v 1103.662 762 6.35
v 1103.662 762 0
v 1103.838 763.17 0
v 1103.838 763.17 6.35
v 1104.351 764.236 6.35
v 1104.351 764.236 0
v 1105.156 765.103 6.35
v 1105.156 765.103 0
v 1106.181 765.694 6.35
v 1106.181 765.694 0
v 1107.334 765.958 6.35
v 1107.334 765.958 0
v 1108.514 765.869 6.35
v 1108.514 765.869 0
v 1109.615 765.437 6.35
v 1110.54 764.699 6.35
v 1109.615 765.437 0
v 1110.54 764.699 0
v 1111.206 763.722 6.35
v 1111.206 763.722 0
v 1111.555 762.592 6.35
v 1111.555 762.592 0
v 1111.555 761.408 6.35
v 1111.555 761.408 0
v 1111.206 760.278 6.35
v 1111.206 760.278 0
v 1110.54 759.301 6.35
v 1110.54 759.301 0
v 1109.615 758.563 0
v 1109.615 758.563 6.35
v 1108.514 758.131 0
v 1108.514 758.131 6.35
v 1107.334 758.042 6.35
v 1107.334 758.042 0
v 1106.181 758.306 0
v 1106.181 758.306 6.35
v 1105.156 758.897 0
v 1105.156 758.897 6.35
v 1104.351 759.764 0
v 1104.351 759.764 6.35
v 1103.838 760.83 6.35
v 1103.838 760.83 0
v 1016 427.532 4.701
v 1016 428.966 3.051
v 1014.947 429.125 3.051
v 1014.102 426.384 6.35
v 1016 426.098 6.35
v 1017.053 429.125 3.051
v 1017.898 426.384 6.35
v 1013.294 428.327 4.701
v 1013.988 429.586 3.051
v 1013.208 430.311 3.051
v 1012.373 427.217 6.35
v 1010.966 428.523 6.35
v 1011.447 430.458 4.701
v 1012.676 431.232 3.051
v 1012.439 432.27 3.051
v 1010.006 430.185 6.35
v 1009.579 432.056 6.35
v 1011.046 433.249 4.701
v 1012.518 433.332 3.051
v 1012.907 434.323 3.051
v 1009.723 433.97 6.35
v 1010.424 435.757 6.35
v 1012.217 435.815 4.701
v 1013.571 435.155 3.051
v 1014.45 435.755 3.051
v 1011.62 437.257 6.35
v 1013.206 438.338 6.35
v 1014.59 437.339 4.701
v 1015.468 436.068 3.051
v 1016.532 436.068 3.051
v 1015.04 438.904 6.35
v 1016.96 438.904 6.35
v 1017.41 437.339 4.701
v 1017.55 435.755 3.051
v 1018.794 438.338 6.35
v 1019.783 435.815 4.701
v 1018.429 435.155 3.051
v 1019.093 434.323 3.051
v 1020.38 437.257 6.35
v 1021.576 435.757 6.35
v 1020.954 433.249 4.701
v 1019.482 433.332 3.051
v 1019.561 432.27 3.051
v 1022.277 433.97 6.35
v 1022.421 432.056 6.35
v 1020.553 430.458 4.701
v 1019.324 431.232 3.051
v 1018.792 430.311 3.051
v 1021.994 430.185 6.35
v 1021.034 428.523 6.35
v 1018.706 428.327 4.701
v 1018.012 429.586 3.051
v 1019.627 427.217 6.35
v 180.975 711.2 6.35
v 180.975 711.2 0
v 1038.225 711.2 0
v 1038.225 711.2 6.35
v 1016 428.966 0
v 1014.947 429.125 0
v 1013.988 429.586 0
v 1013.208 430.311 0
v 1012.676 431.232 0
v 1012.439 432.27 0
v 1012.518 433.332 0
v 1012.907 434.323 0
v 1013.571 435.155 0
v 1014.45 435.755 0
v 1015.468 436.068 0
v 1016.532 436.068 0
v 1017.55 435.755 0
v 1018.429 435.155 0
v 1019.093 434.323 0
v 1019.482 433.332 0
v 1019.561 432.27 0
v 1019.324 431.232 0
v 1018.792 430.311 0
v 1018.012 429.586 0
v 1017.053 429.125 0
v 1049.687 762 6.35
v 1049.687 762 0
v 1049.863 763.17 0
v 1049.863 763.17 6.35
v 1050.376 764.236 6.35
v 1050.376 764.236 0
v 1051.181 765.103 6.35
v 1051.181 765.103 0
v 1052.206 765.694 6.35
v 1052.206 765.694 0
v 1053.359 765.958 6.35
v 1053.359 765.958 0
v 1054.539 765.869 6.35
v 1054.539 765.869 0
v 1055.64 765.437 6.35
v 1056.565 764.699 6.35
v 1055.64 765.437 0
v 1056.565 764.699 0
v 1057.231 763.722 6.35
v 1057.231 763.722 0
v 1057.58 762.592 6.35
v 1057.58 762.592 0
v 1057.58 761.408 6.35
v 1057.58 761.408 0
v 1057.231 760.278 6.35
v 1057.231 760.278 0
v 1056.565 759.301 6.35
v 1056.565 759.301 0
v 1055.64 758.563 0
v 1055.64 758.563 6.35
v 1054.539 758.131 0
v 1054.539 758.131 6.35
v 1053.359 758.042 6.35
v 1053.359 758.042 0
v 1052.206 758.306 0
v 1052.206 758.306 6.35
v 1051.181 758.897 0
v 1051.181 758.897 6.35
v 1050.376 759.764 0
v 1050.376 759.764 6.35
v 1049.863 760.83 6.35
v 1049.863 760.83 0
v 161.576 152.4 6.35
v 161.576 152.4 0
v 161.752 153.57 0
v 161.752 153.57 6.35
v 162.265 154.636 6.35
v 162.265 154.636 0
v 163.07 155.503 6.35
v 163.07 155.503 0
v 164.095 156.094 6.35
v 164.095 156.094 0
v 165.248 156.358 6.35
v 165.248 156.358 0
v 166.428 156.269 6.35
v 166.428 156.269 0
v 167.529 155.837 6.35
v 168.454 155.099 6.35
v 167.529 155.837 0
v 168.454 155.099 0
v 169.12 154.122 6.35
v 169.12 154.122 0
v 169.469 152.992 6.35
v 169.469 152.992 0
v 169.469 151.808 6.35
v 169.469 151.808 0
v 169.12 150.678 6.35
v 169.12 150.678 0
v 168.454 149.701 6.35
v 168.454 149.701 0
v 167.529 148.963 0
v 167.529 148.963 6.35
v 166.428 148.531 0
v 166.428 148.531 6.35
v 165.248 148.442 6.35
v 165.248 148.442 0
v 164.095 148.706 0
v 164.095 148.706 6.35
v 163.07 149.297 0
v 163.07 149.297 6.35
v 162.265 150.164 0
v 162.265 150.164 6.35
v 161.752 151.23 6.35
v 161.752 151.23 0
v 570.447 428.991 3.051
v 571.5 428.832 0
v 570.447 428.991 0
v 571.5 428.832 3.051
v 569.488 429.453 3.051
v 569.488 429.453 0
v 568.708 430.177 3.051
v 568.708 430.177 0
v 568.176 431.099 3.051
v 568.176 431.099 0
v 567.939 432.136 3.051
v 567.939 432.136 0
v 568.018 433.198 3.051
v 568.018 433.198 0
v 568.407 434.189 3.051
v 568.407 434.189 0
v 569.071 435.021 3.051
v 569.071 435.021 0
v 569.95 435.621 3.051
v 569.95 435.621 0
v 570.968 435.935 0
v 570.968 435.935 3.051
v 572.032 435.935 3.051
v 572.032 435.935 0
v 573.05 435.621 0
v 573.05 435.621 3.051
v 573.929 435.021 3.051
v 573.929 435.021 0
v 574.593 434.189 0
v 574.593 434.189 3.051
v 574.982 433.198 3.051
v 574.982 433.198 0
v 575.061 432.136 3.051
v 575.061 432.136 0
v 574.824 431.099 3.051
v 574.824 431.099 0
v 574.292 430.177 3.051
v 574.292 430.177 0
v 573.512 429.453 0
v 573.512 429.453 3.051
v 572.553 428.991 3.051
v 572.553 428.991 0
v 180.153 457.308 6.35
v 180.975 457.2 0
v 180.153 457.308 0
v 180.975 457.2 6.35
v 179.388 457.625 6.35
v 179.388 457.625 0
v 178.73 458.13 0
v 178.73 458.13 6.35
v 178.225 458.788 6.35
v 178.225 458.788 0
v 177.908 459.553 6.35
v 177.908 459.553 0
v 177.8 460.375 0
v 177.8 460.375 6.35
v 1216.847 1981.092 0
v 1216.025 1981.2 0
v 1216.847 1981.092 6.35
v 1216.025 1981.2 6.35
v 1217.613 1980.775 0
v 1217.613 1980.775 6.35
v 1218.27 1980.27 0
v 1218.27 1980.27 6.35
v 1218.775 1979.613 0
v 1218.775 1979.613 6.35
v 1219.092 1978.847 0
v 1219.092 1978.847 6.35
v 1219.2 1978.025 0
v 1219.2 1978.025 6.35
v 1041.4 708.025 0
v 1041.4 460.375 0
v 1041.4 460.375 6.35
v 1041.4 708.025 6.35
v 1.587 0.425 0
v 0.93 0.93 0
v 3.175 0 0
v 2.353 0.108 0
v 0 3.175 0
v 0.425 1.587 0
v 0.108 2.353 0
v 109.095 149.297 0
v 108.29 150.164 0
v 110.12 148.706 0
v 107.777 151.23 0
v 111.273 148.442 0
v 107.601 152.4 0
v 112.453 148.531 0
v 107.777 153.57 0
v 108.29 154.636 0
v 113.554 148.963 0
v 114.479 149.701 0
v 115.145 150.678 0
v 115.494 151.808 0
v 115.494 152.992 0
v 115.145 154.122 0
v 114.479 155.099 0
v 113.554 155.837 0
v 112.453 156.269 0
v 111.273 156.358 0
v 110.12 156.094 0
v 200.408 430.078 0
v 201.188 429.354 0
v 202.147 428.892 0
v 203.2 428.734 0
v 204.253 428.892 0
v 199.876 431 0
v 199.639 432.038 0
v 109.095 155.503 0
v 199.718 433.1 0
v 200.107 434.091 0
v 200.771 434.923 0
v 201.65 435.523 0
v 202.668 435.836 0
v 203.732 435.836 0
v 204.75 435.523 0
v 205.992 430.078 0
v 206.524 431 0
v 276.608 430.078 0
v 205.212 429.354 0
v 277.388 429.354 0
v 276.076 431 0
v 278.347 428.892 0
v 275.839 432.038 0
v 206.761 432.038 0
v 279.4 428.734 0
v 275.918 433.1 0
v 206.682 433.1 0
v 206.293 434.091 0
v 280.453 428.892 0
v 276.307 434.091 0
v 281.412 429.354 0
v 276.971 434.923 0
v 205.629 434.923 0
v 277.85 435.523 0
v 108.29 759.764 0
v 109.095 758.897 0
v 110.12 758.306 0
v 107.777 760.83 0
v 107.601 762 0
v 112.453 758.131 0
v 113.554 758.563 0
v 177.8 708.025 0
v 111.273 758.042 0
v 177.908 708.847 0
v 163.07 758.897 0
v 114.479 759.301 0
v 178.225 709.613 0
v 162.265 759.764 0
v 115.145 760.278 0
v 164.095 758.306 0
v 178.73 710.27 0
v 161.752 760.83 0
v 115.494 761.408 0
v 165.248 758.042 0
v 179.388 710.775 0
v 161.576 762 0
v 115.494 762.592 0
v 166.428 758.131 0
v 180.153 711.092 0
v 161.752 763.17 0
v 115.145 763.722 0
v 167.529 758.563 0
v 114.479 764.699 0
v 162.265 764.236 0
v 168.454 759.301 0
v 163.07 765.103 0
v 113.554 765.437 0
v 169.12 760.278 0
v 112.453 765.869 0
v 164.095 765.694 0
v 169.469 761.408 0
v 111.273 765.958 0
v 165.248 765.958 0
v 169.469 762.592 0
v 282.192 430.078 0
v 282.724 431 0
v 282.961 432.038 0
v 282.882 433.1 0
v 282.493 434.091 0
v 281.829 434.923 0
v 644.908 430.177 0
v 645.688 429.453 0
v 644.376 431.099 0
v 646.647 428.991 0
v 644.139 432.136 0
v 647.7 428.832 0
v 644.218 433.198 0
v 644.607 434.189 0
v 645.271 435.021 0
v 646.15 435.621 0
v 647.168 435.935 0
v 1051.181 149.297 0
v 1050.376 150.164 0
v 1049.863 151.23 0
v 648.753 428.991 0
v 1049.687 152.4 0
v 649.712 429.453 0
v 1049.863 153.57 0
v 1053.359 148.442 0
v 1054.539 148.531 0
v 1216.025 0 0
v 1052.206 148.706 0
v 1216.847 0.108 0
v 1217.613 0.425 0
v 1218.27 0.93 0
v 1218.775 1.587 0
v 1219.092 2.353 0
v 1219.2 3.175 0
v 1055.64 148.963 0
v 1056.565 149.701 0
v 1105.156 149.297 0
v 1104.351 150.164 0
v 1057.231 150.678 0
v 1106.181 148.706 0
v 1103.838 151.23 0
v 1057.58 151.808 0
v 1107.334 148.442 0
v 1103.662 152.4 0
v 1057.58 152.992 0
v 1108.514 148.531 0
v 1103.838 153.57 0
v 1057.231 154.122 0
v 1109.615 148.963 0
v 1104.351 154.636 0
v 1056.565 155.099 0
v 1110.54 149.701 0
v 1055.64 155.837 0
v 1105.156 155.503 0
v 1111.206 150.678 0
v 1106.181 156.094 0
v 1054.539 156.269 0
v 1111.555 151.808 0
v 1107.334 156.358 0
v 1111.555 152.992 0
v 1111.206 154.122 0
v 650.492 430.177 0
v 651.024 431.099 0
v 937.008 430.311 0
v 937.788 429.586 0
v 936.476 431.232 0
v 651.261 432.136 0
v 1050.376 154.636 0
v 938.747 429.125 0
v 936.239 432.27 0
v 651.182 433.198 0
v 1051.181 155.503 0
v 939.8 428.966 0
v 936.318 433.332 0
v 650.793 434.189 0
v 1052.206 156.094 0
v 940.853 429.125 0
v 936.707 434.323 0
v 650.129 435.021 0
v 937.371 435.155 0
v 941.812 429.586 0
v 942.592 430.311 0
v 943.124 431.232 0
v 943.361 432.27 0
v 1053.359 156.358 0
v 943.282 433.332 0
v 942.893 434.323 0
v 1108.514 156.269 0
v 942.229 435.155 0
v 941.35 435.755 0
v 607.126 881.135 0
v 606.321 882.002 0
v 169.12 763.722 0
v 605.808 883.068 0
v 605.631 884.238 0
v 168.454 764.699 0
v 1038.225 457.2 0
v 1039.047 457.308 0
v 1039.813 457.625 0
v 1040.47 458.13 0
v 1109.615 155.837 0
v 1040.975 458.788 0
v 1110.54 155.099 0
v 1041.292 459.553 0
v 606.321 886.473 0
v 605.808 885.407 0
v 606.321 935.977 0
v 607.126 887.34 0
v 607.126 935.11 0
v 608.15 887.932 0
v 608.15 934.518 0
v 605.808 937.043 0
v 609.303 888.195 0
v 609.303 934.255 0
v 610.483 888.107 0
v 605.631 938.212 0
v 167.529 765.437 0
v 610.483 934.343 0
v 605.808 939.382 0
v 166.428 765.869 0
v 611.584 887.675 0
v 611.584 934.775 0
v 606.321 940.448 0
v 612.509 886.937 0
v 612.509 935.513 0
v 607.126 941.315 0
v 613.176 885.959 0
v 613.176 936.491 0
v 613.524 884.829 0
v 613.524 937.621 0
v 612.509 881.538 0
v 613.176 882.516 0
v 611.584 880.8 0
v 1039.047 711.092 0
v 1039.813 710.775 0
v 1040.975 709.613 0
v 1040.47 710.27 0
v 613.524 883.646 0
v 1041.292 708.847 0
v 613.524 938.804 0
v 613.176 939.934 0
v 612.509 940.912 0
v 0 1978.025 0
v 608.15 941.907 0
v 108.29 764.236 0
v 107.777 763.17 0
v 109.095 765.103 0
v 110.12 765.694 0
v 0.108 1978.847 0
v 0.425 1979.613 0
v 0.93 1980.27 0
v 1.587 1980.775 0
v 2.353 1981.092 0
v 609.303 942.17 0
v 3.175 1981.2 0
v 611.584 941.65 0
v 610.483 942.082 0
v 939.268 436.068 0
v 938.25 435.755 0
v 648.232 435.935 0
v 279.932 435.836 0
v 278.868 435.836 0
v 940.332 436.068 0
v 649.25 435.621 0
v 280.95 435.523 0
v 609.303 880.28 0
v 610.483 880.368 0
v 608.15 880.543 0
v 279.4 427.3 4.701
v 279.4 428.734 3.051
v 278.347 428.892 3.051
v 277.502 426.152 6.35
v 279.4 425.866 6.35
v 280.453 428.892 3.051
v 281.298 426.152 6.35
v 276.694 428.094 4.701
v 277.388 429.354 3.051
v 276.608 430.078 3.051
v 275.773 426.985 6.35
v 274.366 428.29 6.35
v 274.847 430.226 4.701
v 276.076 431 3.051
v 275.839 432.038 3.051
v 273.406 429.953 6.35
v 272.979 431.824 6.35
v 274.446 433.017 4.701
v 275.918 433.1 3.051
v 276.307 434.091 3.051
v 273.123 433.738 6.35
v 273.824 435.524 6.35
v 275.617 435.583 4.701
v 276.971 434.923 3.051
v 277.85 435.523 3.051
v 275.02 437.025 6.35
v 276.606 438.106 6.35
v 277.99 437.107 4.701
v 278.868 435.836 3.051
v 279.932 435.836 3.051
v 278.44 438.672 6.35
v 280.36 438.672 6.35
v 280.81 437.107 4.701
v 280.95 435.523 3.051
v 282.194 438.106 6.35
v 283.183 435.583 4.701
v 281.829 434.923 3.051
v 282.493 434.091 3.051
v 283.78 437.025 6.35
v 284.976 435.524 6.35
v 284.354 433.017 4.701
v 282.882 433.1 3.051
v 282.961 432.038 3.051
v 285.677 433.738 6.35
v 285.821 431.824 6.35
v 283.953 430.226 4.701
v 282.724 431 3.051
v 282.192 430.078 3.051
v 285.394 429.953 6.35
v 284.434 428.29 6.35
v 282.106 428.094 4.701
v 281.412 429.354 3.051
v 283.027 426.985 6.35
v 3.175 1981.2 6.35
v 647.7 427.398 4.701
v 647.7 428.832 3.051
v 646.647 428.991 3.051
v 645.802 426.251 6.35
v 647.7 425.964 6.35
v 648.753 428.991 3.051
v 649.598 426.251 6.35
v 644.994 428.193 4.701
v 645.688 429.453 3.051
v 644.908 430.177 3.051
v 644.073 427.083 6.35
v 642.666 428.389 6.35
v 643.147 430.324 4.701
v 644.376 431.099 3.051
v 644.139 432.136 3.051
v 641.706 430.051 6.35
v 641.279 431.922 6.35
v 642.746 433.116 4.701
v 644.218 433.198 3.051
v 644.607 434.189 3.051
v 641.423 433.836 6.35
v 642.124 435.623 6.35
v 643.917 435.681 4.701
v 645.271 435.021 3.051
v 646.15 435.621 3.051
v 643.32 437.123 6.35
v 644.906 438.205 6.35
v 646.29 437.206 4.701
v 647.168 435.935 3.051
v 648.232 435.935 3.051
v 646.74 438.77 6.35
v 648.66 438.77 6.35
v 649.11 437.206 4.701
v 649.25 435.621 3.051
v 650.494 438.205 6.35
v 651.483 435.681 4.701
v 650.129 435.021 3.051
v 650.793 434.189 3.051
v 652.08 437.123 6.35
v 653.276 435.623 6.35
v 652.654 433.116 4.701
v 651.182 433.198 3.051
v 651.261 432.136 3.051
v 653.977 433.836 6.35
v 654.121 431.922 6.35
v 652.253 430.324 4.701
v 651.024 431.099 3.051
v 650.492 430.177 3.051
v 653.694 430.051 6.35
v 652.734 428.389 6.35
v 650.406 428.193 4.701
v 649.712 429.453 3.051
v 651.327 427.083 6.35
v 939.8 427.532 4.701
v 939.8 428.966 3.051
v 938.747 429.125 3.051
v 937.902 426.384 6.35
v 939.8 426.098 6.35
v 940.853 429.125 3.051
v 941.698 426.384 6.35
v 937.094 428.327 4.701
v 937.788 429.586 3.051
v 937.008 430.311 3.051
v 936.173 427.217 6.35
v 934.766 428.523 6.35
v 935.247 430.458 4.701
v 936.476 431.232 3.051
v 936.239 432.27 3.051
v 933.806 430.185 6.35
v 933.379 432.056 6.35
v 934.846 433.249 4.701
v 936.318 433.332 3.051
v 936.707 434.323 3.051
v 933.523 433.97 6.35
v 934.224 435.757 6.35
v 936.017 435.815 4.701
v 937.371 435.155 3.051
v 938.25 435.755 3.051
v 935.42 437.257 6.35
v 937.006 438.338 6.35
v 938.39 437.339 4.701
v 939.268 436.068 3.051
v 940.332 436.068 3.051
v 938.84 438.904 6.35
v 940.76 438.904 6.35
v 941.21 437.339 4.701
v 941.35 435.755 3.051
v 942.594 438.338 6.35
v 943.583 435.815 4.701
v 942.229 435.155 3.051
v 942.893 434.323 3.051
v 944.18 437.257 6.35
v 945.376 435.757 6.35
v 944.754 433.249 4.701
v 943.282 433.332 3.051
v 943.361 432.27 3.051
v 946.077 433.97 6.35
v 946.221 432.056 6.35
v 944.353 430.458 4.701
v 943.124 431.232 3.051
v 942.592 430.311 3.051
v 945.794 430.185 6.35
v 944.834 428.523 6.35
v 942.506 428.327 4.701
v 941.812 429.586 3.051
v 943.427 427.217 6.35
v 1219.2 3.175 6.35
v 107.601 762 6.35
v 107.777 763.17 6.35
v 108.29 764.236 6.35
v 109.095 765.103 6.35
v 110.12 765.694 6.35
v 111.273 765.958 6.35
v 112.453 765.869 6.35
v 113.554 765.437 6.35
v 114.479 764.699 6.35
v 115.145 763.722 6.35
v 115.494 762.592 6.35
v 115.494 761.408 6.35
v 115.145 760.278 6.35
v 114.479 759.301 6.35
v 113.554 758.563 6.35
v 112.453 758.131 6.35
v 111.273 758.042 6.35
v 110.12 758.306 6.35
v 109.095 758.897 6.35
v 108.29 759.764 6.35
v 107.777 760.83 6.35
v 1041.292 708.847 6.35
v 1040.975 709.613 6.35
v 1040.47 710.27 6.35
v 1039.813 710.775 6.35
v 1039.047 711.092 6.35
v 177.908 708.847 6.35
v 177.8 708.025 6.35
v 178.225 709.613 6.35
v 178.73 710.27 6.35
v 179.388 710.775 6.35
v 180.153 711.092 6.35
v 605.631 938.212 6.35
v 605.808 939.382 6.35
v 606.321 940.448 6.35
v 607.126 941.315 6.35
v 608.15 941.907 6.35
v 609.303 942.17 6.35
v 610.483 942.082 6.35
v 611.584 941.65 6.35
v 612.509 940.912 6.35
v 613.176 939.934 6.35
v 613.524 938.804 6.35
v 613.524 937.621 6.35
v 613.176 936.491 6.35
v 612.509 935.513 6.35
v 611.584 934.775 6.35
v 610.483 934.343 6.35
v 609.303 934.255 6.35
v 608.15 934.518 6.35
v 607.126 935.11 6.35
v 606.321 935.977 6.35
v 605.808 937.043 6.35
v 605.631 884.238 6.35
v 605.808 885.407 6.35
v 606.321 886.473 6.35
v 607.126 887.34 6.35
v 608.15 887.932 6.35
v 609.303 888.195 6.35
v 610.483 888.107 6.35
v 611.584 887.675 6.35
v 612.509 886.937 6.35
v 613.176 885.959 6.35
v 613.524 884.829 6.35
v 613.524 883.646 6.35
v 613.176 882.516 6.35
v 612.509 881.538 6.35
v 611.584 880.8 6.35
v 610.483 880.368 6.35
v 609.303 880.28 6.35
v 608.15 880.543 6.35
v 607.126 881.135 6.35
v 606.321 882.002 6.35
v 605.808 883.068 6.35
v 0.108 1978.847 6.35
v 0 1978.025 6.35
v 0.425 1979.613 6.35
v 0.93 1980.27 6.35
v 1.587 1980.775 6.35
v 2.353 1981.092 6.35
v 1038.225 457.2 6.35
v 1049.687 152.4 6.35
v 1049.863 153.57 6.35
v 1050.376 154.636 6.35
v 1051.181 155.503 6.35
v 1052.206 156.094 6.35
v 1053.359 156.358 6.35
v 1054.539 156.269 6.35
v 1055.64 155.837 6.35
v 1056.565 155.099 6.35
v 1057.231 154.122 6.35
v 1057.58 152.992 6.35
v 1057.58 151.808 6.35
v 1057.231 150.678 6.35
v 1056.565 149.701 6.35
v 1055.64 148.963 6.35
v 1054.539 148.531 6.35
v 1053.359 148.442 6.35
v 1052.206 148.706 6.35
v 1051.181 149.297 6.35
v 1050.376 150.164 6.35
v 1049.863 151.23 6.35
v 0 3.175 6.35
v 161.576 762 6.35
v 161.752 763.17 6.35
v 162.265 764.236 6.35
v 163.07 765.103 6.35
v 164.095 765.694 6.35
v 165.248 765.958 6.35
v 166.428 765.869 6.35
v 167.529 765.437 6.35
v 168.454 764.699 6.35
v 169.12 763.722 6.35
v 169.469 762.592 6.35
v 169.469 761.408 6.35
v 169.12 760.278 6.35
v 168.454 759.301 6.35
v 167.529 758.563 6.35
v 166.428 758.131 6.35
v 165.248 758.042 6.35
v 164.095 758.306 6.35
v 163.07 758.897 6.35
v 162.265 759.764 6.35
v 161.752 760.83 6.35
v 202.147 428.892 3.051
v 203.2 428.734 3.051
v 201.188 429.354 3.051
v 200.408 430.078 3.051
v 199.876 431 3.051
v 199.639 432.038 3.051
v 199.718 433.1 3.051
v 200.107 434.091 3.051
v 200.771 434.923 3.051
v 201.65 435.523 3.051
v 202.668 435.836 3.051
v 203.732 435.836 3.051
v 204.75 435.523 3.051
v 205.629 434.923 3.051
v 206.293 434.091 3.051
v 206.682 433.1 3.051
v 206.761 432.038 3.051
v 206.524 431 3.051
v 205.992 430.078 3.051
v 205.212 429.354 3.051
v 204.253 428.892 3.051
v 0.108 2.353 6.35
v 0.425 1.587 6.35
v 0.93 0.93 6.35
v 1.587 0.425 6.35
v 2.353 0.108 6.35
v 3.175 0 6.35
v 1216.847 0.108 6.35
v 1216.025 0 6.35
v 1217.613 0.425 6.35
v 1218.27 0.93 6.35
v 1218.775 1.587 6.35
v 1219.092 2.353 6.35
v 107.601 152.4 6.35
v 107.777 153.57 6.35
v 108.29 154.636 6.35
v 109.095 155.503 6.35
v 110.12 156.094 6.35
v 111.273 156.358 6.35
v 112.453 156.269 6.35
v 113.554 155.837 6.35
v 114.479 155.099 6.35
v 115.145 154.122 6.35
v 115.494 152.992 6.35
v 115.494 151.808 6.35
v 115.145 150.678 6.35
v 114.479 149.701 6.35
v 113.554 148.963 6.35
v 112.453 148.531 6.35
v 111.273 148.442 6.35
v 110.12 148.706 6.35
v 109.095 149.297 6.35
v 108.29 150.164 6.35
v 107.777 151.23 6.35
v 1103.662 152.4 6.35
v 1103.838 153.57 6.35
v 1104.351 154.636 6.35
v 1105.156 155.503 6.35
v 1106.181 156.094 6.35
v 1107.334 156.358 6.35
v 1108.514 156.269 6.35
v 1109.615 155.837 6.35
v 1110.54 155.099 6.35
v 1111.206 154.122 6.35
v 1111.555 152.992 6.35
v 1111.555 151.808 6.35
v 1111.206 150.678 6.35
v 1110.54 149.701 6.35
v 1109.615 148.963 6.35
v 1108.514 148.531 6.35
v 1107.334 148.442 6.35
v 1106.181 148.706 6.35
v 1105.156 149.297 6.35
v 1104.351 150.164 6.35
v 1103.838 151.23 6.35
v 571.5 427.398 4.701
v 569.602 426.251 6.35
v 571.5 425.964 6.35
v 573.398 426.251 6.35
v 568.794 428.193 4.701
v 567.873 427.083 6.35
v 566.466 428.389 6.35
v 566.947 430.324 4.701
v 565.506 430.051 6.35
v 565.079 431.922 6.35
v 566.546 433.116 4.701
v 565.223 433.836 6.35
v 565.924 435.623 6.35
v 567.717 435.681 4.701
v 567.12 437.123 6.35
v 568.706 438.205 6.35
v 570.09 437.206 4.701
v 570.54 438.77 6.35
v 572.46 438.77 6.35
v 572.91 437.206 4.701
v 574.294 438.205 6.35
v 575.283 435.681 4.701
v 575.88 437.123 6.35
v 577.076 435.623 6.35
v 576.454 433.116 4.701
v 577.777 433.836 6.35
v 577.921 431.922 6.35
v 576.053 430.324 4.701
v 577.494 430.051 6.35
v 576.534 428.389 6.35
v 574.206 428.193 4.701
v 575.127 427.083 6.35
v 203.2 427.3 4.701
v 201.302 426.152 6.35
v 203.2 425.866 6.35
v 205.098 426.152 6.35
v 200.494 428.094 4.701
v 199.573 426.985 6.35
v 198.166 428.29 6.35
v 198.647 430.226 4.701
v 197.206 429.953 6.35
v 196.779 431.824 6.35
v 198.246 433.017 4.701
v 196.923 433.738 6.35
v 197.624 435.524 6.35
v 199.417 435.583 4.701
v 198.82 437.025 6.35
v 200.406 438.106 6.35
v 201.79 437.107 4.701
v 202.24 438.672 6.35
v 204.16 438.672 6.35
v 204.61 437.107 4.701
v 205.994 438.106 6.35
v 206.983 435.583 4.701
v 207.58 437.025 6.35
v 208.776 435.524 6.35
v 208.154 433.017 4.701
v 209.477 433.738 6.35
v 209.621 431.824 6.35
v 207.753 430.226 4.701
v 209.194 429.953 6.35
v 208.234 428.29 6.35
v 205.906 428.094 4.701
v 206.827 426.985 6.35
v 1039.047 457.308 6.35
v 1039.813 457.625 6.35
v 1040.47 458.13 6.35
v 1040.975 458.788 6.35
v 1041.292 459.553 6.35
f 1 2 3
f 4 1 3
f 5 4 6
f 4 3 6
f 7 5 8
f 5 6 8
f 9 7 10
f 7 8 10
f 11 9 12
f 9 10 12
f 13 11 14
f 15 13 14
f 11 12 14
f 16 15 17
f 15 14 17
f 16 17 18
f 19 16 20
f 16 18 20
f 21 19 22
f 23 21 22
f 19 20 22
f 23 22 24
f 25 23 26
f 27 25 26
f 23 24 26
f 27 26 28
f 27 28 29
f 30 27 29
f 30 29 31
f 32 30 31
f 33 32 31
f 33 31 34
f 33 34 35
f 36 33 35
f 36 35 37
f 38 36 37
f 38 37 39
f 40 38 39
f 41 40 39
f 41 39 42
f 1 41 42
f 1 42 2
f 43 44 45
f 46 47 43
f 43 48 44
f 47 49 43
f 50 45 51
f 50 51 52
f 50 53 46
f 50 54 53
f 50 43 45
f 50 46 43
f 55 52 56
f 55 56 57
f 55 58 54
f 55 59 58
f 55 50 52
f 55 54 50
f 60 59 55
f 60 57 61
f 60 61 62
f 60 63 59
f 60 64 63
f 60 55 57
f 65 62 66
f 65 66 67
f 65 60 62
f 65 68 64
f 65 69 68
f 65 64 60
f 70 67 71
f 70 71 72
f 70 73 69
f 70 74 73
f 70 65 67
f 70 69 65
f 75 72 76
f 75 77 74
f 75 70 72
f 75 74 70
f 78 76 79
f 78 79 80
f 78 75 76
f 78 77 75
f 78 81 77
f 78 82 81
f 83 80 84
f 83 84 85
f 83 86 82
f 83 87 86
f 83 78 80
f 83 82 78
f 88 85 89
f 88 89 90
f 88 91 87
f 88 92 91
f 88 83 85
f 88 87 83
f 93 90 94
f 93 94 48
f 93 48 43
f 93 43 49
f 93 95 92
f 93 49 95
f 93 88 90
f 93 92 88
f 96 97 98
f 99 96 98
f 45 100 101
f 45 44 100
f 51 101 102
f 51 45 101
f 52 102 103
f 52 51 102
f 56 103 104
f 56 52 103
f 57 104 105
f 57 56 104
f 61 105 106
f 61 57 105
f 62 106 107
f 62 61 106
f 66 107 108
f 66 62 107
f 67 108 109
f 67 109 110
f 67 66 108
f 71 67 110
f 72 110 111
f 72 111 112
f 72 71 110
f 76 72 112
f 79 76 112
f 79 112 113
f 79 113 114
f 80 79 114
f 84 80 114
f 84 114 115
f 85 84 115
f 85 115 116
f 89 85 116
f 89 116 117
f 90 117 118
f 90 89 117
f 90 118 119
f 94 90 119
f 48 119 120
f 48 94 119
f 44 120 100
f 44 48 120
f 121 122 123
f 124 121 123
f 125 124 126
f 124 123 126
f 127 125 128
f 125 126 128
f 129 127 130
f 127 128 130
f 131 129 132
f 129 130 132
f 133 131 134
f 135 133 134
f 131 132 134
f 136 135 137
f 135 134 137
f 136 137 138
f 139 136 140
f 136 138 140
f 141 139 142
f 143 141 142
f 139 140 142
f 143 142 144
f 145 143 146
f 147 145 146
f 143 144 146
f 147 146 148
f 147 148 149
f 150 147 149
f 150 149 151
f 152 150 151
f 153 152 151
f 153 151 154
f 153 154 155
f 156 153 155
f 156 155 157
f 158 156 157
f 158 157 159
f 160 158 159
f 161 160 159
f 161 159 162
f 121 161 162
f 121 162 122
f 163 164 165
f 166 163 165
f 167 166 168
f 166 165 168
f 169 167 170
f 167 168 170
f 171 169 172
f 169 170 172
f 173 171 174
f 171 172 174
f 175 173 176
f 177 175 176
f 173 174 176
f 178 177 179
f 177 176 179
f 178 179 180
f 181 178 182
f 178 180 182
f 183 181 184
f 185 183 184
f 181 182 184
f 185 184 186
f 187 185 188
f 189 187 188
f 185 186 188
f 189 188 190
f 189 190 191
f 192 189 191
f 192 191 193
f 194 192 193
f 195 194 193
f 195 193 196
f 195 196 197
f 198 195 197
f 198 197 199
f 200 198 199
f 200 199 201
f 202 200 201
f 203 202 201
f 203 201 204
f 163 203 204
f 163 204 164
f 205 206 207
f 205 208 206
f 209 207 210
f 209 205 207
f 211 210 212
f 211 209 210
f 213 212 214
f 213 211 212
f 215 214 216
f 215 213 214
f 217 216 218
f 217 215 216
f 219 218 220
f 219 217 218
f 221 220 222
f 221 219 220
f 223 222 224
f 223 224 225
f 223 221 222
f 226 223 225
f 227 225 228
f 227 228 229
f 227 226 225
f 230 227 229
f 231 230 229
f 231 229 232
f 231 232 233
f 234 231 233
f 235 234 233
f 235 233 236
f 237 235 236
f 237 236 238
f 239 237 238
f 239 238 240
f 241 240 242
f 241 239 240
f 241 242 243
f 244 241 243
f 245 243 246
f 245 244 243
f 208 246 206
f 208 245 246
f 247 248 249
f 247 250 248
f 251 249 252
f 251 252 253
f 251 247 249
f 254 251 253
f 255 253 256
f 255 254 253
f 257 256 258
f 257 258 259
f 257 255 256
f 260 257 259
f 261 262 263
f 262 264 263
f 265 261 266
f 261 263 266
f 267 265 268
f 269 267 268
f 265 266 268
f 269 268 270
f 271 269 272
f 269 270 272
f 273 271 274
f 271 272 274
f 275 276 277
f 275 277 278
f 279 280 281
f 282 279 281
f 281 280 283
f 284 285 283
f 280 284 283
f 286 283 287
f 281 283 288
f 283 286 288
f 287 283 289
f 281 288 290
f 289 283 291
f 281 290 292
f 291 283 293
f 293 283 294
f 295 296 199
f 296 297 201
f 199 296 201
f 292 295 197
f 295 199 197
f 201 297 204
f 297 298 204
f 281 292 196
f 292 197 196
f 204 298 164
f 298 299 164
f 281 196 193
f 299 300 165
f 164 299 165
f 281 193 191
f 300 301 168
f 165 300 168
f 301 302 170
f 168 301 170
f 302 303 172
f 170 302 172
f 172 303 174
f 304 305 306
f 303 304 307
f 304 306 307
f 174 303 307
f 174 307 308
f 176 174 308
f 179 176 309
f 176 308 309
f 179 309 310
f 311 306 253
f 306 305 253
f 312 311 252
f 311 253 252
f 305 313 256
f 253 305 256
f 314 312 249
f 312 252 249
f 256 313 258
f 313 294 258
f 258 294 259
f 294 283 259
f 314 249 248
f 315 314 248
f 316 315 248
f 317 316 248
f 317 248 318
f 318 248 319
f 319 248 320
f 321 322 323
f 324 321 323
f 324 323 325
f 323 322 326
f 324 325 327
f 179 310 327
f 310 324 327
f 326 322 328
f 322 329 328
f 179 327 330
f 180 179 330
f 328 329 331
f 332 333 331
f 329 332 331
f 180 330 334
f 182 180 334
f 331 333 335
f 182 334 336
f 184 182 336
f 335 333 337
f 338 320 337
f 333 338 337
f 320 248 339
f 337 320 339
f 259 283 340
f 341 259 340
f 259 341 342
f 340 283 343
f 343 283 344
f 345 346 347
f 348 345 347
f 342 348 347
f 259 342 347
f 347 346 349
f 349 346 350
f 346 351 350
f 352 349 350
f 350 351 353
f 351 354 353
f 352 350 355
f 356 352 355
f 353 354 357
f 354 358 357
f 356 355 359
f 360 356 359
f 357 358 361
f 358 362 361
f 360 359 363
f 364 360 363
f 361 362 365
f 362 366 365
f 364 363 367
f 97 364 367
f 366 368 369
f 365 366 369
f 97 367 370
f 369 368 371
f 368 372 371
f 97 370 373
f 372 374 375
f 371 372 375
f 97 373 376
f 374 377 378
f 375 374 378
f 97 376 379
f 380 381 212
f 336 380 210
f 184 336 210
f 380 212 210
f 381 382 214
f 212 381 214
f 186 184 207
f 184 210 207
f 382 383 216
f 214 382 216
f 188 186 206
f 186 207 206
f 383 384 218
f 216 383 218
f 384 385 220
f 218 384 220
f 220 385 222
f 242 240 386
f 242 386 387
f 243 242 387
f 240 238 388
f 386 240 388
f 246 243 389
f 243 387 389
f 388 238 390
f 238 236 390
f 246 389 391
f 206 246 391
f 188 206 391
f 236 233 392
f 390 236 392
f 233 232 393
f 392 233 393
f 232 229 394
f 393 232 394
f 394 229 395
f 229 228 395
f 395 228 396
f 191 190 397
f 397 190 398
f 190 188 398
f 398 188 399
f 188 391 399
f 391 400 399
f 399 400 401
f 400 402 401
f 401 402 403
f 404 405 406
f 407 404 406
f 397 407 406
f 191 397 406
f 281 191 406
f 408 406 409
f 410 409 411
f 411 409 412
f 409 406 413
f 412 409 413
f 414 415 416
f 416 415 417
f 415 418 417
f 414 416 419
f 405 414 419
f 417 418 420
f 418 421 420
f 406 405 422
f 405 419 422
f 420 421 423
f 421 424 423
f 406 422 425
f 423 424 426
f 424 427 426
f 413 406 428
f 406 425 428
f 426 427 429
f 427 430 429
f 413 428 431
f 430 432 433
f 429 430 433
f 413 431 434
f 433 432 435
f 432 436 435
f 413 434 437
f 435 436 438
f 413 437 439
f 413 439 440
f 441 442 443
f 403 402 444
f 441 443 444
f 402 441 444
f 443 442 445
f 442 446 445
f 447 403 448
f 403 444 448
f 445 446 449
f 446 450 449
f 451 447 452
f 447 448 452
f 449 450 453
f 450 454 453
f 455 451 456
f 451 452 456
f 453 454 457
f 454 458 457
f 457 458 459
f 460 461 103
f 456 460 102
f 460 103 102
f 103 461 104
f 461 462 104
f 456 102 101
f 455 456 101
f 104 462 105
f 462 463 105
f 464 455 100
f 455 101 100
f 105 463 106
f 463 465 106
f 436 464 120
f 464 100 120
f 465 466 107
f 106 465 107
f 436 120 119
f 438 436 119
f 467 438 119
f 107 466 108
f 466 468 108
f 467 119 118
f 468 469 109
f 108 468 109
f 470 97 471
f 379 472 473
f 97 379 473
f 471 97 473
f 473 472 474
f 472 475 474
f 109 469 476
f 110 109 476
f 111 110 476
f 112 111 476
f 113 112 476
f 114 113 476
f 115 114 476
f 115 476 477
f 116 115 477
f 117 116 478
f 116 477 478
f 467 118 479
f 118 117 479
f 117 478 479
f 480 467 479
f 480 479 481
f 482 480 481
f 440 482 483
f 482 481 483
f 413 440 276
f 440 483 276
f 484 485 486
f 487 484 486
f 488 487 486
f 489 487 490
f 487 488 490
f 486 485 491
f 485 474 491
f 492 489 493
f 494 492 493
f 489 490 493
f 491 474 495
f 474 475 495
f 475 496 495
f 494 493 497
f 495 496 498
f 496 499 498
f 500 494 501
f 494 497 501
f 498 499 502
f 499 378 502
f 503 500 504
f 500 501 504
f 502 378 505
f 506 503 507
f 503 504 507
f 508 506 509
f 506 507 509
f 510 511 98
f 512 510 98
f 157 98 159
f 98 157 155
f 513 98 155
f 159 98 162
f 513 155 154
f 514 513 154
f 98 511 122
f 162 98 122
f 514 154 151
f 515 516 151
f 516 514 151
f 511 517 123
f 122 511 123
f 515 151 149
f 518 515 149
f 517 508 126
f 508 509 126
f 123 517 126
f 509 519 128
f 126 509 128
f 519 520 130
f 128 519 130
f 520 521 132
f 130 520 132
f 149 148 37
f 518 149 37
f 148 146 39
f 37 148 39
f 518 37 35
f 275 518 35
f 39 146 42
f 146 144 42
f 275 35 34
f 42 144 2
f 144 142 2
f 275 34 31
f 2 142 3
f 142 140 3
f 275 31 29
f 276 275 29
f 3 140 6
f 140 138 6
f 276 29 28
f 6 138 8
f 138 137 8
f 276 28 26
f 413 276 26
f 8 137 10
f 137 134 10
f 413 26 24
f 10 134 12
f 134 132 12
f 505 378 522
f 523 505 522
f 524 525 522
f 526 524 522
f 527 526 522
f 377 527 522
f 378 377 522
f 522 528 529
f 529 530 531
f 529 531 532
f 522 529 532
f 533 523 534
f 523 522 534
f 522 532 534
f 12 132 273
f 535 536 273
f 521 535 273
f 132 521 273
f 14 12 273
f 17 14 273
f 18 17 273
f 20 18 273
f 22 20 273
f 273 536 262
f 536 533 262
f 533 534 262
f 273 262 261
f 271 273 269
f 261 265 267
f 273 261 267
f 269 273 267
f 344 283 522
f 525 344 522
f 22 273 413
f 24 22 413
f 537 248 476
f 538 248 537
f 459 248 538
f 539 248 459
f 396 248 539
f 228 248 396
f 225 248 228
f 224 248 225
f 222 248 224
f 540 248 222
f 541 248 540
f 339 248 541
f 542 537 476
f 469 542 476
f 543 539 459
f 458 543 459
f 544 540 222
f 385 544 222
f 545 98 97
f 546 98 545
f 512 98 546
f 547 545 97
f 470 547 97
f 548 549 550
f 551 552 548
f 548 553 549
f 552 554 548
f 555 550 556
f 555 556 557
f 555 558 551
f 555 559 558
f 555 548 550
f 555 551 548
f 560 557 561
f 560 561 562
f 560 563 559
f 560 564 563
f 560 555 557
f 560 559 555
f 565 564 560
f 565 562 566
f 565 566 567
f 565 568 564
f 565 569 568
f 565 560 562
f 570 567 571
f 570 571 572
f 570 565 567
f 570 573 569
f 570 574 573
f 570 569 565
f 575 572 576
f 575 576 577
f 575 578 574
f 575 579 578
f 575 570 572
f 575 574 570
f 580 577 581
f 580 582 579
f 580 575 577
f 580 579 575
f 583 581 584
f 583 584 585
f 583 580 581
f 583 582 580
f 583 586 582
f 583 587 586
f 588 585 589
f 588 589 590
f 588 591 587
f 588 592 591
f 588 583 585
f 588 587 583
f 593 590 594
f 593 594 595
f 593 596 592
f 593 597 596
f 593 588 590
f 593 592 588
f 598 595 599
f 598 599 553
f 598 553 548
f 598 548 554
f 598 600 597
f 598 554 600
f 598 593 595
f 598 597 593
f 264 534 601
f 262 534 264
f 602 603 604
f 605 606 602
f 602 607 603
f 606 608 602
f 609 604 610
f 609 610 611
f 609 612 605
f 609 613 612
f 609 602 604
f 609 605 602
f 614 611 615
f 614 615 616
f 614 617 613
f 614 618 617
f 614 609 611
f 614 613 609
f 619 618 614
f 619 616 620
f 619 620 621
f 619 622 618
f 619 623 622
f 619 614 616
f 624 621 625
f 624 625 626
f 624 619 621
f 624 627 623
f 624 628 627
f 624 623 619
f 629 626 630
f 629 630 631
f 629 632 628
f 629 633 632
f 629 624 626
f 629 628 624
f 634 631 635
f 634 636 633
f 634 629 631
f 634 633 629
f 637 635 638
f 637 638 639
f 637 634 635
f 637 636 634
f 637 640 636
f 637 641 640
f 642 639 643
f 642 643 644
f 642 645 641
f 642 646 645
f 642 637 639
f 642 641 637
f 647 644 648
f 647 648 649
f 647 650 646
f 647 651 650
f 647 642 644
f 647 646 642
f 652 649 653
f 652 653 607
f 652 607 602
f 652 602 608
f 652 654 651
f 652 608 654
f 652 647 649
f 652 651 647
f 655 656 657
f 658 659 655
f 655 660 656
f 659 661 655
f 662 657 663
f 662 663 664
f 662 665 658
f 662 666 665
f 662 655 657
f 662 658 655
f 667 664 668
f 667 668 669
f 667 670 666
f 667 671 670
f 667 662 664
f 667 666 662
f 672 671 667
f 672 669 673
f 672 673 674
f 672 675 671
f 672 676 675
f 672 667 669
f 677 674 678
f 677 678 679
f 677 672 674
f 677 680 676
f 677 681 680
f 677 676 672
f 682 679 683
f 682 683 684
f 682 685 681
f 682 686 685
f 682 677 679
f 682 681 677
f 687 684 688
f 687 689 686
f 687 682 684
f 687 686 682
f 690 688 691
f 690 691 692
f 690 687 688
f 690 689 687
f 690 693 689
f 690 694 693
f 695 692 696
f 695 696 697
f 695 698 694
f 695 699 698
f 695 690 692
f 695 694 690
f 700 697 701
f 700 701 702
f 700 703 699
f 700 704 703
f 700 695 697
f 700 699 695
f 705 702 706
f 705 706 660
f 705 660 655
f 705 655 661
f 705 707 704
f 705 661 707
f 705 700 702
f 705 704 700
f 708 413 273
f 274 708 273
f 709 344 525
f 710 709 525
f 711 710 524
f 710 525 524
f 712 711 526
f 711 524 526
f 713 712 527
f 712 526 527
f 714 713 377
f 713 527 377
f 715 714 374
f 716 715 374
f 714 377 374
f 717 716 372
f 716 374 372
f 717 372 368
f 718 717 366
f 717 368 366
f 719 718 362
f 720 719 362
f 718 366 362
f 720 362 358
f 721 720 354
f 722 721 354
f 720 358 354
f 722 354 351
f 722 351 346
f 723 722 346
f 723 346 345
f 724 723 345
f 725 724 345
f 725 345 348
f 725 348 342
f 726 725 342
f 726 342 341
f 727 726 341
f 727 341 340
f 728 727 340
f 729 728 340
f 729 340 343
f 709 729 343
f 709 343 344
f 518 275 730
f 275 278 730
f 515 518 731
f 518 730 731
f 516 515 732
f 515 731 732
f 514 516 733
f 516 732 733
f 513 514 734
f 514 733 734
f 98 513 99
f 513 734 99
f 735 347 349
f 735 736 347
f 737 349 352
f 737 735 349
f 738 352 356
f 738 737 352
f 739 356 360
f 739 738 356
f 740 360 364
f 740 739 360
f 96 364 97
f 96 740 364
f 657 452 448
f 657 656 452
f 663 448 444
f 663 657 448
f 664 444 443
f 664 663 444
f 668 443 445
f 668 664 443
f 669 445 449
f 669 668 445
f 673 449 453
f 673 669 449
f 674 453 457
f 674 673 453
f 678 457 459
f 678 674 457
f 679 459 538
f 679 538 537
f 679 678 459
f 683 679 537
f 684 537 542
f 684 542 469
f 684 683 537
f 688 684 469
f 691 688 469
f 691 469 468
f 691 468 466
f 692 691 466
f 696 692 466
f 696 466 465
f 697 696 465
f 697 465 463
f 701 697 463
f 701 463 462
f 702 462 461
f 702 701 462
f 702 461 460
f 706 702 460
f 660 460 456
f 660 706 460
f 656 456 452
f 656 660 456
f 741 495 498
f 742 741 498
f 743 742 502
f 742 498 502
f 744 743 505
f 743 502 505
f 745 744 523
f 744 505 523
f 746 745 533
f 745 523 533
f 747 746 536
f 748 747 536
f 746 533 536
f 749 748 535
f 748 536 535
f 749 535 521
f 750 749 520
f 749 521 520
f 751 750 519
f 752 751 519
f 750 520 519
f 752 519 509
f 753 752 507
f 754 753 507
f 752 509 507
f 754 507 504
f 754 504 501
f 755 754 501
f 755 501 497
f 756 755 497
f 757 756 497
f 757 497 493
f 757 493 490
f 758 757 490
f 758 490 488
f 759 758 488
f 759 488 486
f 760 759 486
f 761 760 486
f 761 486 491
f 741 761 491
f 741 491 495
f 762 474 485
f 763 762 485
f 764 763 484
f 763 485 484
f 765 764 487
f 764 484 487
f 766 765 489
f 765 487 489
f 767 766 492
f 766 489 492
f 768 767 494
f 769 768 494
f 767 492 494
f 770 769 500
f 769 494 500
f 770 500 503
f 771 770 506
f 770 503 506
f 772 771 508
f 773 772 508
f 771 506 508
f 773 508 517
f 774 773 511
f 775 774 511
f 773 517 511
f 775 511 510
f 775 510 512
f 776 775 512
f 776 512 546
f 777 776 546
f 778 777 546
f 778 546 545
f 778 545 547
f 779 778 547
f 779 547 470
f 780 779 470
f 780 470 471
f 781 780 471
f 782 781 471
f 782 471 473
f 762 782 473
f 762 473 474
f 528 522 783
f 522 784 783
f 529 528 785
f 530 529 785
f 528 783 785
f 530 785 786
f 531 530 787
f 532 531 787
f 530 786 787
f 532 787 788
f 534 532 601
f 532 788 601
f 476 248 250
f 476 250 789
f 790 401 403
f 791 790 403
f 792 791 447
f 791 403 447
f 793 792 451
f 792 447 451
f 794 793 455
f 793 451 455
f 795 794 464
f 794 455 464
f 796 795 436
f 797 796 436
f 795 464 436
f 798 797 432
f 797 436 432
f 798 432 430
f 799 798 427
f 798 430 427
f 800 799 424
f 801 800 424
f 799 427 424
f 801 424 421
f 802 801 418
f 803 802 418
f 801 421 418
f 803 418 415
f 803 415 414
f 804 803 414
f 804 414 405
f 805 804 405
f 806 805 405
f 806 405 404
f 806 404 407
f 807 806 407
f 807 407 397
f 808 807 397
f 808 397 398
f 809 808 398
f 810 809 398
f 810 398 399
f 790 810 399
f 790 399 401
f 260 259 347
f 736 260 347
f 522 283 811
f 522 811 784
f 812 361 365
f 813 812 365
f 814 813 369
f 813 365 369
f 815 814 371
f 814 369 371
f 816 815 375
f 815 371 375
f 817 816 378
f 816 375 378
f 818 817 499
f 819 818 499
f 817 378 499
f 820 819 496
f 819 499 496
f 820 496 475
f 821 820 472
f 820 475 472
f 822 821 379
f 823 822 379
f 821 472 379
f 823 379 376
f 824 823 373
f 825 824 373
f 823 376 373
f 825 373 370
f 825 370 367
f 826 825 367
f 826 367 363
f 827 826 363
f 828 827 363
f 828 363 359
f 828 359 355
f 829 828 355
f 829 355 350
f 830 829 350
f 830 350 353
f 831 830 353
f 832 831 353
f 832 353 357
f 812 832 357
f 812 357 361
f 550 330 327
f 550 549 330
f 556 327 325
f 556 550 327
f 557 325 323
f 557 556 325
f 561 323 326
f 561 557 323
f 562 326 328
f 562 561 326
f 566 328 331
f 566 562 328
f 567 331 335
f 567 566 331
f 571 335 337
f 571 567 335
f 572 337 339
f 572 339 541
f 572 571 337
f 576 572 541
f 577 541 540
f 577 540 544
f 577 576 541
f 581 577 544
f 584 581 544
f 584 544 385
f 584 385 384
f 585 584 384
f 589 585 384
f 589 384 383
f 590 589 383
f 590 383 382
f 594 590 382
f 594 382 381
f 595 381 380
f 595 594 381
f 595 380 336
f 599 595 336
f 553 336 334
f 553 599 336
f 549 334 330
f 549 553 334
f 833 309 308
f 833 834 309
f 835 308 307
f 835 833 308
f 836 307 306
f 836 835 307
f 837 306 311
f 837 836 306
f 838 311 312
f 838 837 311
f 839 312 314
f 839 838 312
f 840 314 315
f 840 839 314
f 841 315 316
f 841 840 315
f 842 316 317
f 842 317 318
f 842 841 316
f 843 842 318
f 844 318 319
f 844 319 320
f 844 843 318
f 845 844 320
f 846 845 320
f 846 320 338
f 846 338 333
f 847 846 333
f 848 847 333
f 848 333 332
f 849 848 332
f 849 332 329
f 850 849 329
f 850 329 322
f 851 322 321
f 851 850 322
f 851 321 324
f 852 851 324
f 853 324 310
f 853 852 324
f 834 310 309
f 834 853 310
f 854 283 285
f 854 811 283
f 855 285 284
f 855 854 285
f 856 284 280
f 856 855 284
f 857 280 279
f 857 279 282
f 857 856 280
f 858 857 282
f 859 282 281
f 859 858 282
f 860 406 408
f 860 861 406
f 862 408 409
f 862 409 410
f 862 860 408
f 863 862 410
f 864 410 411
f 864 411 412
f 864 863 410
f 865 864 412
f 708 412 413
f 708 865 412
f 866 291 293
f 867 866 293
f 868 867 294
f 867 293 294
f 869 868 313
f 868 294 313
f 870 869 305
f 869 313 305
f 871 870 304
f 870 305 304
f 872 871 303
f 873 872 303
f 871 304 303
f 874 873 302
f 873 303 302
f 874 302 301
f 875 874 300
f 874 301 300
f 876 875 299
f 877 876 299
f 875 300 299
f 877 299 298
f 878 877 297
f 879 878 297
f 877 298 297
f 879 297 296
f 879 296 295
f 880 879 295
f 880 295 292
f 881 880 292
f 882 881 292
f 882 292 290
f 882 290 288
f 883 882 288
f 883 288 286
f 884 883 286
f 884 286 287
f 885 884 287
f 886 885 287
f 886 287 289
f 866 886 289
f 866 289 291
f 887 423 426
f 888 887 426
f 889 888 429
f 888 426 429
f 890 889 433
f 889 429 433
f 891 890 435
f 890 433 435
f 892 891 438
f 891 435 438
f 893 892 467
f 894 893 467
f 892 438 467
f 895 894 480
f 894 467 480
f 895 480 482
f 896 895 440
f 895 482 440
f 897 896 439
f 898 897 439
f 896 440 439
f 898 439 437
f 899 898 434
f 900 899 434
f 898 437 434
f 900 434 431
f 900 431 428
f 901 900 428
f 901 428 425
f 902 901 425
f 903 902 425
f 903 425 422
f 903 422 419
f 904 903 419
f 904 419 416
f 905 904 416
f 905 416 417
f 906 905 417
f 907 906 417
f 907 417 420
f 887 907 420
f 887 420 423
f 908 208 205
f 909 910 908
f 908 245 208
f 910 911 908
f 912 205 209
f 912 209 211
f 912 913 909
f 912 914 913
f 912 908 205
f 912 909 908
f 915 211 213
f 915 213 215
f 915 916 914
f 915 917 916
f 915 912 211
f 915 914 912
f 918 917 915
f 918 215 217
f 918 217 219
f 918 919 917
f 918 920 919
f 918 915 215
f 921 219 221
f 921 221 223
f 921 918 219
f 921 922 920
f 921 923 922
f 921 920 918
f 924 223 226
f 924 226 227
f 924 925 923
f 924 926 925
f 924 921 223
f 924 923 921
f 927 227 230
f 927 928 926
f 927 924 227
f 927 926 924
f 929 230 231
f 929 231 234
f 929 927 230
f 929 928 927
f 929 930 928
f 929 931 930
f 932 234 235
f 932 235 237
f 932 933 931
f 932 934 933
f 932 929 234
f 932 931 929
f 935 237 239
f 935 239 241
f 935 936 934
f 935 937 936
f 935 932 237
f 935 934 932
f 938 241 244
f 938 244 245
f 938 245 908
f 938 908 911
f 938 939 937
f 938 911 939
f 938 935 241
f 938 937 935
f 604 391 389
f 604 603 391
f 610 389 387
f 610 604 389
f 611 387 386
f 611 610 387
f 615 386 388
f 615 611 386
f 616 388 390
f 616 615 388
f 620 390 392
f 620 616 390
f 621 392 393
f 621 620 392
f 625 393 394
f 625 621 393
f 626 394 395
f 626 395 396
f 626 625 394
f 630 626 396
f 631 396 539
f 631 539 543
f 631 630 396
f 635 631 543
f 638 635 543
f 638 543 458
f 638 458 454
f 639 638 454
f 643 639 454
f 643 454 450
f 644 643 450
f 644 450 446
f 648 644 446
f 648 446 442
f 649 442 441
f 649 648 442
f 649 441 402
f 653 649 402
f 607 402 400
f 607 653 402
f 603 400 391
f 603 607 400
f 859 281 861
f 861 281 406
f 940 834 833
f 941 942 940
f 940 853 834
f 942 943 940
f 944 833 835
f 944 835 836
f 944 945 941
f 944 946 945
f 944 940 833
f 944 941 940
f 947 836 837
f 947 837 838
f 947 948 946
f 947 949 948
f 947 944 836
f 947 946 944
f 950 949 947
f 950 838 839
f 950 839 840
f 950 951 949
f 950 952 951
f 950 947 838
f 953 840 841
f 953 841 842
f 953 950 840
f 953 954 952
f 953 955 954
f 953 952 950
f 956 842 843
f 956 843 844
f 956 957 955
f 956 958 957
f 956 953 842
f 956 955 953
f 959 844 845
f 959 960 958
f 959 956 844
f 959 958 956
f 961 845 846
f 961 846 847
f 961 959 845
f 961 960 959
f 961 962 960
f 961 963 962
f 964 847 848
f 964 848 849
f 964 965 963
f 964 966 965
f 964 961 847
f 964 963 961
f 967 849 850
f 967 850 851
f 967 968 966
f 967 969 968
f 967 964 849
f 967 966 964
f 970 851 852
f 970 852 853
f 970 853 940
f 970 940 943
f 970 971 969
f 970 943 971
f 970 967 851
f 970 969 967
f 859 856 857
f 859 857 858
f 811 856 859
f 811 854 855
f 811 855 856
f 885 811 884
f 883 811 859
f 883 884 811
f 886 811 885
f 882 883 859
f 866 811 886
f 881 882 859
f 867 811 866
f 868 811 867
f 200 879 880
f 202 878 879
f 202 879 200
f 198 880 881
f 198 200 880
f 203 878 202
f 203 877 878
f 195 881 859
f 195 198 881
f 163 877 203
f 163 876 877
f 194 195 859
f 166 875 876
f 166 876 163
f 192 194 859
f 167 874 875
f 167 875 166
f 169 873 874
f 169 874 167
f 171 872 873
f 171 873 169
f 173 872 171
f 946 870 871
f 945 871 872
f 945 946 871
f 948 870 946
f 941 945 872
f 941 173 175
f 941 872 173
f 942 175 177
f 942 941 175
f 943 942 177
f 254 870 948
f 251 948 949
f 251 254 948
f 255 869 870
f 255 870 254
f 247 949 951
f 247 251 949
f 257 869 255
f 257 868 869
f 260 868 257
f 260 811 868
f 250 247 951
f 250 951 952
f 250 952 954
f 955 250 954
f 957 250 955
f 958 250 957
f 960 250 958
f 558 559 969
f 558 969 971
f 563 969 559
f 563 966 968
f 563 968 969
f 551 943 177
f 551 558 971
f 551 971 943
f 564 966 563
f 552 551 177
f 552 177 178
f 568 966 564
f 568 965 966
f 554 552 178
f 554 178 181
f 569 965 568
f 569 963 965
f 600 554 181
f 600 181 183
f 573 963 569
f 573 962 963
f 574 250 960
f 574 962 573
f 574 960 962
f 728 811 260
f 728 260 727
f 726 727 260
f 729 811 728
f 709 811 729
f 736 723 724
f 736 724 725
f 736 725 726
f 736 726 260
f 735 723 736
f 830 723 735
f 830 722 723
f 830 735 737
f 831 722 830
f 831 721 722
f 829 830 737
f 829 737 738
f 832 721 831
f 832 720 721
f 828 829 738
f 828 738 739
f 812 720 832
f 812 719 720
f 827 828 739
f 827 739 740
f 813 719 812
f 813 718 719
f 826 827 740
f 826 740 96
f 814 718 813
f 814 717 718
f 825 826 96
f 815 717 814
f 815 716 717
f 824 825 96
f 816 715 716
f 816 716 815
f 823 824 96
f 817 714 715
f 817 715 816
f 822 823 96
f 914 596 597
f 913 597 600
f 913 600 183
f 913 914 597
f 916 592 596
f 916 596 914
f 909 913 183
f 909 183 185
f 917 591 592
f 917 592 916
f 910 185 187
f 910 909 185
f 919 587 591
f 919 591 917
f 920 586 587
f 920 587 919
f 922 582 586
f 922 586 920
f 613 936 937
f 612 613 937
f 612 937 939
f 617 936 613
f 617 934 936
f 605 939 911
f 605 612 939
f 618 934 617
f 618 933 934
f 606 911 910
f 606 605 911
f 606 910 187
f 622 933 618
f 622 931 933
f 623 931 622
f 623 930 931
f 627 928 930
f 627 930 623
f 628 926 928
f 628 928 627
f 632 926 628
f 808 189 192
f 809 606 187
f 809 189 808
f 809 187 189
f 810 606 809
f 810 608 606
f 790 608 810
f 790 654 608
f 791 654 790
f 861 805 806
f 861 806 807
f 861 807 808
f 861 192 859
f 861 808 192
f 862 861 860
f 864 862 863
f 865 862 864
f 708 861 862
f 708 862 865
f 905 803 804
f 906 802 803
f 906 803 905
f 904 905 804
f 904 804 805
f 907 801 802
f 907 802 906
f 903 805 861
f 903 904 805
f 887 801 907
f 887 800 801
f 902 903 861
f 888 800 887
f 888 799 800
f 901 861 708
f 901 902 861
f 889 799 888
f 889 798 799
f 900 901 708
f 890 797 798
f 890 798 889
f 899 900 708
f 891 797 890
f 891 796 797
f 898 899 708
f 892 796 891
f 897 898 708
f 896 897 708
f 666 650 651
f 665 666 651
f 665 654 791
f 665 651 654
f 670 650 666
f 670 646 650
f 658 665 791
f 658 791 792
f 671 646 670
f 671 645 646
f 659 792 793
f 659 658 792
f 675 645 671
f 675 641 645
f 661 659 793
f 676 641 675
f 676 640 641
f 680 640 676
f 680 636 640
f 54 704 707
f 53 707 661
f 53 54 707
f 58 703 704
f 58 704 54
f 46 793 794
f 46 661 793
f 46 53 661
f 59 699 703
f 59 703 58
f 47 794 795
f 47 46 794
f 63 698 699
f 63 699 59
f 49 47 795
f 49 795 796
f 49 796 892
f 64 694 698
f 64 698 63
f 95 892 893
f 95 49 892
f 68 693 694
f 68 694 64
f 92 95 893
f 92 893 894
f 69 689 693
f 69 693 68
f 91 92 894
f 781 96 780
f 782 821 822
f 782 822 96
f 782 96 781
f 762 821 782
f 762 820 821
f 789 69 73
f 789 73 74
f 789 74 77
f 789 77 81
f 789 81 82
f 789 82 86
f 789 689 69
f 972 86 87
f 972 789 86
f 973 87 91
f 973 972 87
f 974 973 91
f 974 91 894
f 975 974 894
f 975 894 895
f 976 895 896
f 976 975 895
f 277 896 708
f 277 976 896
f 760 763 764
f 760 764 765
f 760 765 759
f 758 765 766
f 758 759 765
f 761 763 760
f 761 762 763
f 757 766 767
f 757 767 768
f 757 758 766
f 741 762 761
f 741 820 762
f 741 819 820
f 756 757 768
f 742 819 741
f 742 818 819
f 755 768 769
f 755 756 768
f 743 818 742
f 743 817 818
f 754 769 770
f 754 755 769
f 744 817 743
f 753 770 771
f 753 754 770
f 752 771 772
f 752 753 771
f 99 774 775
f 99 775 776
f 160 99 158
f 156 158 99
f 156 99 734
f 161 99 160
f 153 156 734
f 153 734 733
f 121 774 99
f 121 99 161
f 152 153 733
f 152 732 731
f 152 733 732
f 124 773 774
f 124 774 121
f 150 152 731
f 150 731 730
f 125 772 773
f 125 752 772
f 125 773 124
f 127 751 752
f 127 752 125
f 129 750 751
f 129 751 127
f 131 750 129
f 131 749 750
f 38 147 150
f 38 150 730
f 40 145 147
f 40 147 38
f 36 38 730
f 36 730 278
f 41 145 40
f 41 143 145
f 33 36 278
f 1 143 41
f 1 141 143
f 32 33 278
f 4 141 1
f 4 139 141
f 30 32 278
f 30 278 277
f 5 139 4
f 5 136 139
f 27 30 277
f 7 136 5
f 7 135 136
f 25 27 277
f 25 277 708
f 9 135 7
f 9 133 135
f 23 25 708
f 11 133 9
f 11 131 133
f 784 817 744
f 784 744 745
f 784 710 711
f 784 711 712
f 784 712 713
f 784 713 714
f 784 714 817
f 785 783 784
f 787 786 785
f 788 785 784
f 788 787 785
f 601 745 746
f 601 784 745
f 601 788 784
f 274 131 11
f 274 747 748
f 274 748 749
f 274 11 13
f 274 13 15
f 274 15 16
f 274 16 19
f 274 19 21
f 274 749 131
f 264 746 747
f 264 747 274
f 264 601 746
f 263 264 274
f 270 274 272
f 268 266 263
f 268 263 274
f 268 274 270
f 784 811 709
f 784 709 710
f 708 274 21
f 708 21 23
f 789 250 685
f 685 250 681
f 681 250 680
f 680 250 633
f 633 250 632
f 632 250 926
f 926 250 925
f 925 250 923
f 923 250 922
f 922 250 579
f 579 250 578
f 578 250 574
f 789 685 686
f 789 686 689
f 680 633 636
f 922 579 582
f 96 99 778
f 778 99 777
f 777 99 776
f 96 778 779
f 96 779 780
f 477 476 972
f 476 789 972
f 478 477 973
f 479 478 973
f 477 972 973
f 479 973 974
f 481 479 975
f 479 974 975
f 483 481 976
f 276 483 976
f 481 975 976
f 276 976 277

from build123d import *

# Parameters (mm, degrees)
SKETCH1_W                                     = 1219.2
SKETCH1_H                                     = 1981.2
SKETCH1_W_2                                   = 863.6
SKETCH1_H_2                                   = 254
BOSS_EXTRUDE1_DEPTH                           = 6.35
CSK_FOR_1_4_FLAT_HEAD_MACHINE_SCREW1_AT_COUNT = 2
CSK_FOR_1_4_FLAT_HEAD_MACHINE_SCREW1_AT_PITCH = 76.2
CSK_FOR_1_4_FLAT_HEAD_MACHINE_SCREW1_2_COUNT  = 2
CSK_FOR_1_4_FLAT_HEAD_MACHINE_SCREW1_2_PITCH  = 736.600036601
CSK_FOR_1_4_FLAT_HEAD_MACHINE_SCREW1_3_COUNT  = 2
CSK_FOR_1_4_FLAT_HEAD_MACHINE_SCREW1_3_PITCH  = 812.800033169
CSK_FOR_1_4_FLAT_HEAD_MACHINE_SCREW1_4_COUNT  = 2
CSK_FOR_1_4_FLAT_HEAD_MACHINE_SCREW1_4_PITCH  = 368.300013149
CSK_FOR_1_4_FLAT_HEAD_MACHINE_SCREW1_5_COUNT  = 2
CSK_FOR_1_4_FLAT_HEAD_MACHINE_SCREW1_5_PITCH  = 444.500010895
FILLET1_R                                     = 3.175
F_5_16_0_3125_DIAMETER_HOLE2_D                = 7.9375


with BuildPart() as part:
    # Sketch1 → Boss-Extrude1 (new body)
    with BuildSketch(Plane.XY):
        with Locations((609.6, 990.6)):
            Rectangle(SKETCH1_W, SKETCH1_H)
        with Locations((609.6, 584.2)):
            Rectangle(SKETCH1_W_2, SKETCH1_H_2, mode=Mode.SUBTRACT)
    extrude(amount=BOSS_EXTRUDE1_DEPTH)

    # Sketch3 → CSK for 1/4 Flat Head Machine Screw1 (revolve, cut)
    with BuildSketch(Plane(origin=(203.2, 432.304928843, 6.35), x_dir=(0, -1, 0), z_dir=(1, 0, 0))):
        Polygon((0, 0), (0, 6.35), (3.57124, 6.35), (3.57124, 3.298865467), (6.4389, 0), align=None)
    csk_for_1_4_flat_head_machine_screw1 = revolve(axis=Axis((203.2, 432.304928843, 12.7), (0, 0, -1)), mode=Mode.SUBTRACT)

    # CSK for 1/4 Flat Head Machine Screw1 at: CSK for 1/4 Flat Head Machine Screw1 ×2
    with Locations(*[(i * CSK_FOR_1_4_FLAT_HEAD_MACHINE_SCREW1_AT_PITCH, 0, 0) for i in range(1, CSK_FOR_1_4_FLAT_HEAD_MACHINE_SCREW1_AT_COUNT)]):
        add(csk_for_1_4_flat_head_machine_screw1, mode=Mode.SUBTRACT)

    # CSK for 1_4 Flat Head Machine Screw1 2: CSK for 1/4 Flat Head Machine Screw1 ×2
    with Locations(*[Vector(0.99999995, 0.000315241, 0) * (i * CSK_FOR_1_4_FLAT_HEAD_MACHINE_SCREW1_2_PITCH) for i in range(1, CSK_FOR_1_4_FLAT_HEAD_MACHINE_SCREW1_2_COUNT)]):
        add(csk_for_1_4_flat_head_machine_screw1, mode=Mode.SUBTRACT)

    # CSK for 1_4 Flat Head Machine Screw1 3: CSK for 1/4 Flat Head Machine Screw1 ×2
    with Locations(*[Vector(0.999999959, 0.000285687, 0) * (i * CSK_FOR_1_4_FLAT_HEAD_MACHINE_SCREW1_3_PITCH) for i in range(1, CSK_FOR_1_4_FLAT_HEAD_MACHINE_SCREW1_3_COUNT)]):
        add(csk_for_1_4_flat_head_machine_screw1, mode=Mode.SUBTRACT)

    # CSK for 1_4 Flat Head Machine Screw1 4: CSK for 1/4 Flat Head Machine Screw1 ×2
    with Locations(*[Vector(0.999999964, 0.000267211, 0) * (i * CSK_FOR_1_4_FLAT_HEAD_MACHINE_SCREW1_4_PITCH) for i in range(1, CSK_FOR_1_4_FLAT_HEAD_MACHINE_SCREW1_4_COUNT)]):
        add(csk_for_1_4_flat_head_machine_screw1, mode=Mode.SUBTRACT)

    # CSK for 1_4 Flat Head Machine Screw1 5: CSK for 1/4 Flat Head Machine Screw1 ×2
    with Locations(*[Vector(0.999999975, 0.000221404, 0) * (i * CSK_FOR_1_4_FLAT_HEAD_MACHINE_SCREW1_5_PITCH) for i in range(1, CSK_FOR_1_4_FLAT_HEAD_MACHINE_SCREW1_5_COUNT)]):
        add(csk_for_1_4_flat_head_machine_screw1, mode=Mode.SUBTRACT)

    # Fillet1
    fillet1_edges = [part.edges().sort_by_distance(p)[0] for p in [
        (177.8, 711.2, 3.175),
        (177.8, 457.2, 3.175),
        (1041.4, 457.2, 3.175),
        (1041.4, 711.2, 3.175),
        (0, 1981.2, 3.175),
        (1219.2, 1981.2, 3.175),
        (1219.2, 0, 3.175),
        (0, 0, 3.175),
    ]]
    fillet(fillet1_edges, radius=FILLET1_R)

    # 5/16 (0.3125) Diameter Hole2 (through all)
    with Locations(Plane.XY.offset(6.35)):
        with Locations((609.6, 938.2125), (111.5695, 762), (111.5695, 152.4), (165.5445, 152.4), (165.5445, 762), (1053.6555, 152.4), (1107.6305, 152.4), (1107.6305, 762), (1053.6555, 762), (609.6, 884.2375)):
            Hole(F_5_16_0_3125_DIAMETER_HOLE2_D / 2)


solid = part.part
